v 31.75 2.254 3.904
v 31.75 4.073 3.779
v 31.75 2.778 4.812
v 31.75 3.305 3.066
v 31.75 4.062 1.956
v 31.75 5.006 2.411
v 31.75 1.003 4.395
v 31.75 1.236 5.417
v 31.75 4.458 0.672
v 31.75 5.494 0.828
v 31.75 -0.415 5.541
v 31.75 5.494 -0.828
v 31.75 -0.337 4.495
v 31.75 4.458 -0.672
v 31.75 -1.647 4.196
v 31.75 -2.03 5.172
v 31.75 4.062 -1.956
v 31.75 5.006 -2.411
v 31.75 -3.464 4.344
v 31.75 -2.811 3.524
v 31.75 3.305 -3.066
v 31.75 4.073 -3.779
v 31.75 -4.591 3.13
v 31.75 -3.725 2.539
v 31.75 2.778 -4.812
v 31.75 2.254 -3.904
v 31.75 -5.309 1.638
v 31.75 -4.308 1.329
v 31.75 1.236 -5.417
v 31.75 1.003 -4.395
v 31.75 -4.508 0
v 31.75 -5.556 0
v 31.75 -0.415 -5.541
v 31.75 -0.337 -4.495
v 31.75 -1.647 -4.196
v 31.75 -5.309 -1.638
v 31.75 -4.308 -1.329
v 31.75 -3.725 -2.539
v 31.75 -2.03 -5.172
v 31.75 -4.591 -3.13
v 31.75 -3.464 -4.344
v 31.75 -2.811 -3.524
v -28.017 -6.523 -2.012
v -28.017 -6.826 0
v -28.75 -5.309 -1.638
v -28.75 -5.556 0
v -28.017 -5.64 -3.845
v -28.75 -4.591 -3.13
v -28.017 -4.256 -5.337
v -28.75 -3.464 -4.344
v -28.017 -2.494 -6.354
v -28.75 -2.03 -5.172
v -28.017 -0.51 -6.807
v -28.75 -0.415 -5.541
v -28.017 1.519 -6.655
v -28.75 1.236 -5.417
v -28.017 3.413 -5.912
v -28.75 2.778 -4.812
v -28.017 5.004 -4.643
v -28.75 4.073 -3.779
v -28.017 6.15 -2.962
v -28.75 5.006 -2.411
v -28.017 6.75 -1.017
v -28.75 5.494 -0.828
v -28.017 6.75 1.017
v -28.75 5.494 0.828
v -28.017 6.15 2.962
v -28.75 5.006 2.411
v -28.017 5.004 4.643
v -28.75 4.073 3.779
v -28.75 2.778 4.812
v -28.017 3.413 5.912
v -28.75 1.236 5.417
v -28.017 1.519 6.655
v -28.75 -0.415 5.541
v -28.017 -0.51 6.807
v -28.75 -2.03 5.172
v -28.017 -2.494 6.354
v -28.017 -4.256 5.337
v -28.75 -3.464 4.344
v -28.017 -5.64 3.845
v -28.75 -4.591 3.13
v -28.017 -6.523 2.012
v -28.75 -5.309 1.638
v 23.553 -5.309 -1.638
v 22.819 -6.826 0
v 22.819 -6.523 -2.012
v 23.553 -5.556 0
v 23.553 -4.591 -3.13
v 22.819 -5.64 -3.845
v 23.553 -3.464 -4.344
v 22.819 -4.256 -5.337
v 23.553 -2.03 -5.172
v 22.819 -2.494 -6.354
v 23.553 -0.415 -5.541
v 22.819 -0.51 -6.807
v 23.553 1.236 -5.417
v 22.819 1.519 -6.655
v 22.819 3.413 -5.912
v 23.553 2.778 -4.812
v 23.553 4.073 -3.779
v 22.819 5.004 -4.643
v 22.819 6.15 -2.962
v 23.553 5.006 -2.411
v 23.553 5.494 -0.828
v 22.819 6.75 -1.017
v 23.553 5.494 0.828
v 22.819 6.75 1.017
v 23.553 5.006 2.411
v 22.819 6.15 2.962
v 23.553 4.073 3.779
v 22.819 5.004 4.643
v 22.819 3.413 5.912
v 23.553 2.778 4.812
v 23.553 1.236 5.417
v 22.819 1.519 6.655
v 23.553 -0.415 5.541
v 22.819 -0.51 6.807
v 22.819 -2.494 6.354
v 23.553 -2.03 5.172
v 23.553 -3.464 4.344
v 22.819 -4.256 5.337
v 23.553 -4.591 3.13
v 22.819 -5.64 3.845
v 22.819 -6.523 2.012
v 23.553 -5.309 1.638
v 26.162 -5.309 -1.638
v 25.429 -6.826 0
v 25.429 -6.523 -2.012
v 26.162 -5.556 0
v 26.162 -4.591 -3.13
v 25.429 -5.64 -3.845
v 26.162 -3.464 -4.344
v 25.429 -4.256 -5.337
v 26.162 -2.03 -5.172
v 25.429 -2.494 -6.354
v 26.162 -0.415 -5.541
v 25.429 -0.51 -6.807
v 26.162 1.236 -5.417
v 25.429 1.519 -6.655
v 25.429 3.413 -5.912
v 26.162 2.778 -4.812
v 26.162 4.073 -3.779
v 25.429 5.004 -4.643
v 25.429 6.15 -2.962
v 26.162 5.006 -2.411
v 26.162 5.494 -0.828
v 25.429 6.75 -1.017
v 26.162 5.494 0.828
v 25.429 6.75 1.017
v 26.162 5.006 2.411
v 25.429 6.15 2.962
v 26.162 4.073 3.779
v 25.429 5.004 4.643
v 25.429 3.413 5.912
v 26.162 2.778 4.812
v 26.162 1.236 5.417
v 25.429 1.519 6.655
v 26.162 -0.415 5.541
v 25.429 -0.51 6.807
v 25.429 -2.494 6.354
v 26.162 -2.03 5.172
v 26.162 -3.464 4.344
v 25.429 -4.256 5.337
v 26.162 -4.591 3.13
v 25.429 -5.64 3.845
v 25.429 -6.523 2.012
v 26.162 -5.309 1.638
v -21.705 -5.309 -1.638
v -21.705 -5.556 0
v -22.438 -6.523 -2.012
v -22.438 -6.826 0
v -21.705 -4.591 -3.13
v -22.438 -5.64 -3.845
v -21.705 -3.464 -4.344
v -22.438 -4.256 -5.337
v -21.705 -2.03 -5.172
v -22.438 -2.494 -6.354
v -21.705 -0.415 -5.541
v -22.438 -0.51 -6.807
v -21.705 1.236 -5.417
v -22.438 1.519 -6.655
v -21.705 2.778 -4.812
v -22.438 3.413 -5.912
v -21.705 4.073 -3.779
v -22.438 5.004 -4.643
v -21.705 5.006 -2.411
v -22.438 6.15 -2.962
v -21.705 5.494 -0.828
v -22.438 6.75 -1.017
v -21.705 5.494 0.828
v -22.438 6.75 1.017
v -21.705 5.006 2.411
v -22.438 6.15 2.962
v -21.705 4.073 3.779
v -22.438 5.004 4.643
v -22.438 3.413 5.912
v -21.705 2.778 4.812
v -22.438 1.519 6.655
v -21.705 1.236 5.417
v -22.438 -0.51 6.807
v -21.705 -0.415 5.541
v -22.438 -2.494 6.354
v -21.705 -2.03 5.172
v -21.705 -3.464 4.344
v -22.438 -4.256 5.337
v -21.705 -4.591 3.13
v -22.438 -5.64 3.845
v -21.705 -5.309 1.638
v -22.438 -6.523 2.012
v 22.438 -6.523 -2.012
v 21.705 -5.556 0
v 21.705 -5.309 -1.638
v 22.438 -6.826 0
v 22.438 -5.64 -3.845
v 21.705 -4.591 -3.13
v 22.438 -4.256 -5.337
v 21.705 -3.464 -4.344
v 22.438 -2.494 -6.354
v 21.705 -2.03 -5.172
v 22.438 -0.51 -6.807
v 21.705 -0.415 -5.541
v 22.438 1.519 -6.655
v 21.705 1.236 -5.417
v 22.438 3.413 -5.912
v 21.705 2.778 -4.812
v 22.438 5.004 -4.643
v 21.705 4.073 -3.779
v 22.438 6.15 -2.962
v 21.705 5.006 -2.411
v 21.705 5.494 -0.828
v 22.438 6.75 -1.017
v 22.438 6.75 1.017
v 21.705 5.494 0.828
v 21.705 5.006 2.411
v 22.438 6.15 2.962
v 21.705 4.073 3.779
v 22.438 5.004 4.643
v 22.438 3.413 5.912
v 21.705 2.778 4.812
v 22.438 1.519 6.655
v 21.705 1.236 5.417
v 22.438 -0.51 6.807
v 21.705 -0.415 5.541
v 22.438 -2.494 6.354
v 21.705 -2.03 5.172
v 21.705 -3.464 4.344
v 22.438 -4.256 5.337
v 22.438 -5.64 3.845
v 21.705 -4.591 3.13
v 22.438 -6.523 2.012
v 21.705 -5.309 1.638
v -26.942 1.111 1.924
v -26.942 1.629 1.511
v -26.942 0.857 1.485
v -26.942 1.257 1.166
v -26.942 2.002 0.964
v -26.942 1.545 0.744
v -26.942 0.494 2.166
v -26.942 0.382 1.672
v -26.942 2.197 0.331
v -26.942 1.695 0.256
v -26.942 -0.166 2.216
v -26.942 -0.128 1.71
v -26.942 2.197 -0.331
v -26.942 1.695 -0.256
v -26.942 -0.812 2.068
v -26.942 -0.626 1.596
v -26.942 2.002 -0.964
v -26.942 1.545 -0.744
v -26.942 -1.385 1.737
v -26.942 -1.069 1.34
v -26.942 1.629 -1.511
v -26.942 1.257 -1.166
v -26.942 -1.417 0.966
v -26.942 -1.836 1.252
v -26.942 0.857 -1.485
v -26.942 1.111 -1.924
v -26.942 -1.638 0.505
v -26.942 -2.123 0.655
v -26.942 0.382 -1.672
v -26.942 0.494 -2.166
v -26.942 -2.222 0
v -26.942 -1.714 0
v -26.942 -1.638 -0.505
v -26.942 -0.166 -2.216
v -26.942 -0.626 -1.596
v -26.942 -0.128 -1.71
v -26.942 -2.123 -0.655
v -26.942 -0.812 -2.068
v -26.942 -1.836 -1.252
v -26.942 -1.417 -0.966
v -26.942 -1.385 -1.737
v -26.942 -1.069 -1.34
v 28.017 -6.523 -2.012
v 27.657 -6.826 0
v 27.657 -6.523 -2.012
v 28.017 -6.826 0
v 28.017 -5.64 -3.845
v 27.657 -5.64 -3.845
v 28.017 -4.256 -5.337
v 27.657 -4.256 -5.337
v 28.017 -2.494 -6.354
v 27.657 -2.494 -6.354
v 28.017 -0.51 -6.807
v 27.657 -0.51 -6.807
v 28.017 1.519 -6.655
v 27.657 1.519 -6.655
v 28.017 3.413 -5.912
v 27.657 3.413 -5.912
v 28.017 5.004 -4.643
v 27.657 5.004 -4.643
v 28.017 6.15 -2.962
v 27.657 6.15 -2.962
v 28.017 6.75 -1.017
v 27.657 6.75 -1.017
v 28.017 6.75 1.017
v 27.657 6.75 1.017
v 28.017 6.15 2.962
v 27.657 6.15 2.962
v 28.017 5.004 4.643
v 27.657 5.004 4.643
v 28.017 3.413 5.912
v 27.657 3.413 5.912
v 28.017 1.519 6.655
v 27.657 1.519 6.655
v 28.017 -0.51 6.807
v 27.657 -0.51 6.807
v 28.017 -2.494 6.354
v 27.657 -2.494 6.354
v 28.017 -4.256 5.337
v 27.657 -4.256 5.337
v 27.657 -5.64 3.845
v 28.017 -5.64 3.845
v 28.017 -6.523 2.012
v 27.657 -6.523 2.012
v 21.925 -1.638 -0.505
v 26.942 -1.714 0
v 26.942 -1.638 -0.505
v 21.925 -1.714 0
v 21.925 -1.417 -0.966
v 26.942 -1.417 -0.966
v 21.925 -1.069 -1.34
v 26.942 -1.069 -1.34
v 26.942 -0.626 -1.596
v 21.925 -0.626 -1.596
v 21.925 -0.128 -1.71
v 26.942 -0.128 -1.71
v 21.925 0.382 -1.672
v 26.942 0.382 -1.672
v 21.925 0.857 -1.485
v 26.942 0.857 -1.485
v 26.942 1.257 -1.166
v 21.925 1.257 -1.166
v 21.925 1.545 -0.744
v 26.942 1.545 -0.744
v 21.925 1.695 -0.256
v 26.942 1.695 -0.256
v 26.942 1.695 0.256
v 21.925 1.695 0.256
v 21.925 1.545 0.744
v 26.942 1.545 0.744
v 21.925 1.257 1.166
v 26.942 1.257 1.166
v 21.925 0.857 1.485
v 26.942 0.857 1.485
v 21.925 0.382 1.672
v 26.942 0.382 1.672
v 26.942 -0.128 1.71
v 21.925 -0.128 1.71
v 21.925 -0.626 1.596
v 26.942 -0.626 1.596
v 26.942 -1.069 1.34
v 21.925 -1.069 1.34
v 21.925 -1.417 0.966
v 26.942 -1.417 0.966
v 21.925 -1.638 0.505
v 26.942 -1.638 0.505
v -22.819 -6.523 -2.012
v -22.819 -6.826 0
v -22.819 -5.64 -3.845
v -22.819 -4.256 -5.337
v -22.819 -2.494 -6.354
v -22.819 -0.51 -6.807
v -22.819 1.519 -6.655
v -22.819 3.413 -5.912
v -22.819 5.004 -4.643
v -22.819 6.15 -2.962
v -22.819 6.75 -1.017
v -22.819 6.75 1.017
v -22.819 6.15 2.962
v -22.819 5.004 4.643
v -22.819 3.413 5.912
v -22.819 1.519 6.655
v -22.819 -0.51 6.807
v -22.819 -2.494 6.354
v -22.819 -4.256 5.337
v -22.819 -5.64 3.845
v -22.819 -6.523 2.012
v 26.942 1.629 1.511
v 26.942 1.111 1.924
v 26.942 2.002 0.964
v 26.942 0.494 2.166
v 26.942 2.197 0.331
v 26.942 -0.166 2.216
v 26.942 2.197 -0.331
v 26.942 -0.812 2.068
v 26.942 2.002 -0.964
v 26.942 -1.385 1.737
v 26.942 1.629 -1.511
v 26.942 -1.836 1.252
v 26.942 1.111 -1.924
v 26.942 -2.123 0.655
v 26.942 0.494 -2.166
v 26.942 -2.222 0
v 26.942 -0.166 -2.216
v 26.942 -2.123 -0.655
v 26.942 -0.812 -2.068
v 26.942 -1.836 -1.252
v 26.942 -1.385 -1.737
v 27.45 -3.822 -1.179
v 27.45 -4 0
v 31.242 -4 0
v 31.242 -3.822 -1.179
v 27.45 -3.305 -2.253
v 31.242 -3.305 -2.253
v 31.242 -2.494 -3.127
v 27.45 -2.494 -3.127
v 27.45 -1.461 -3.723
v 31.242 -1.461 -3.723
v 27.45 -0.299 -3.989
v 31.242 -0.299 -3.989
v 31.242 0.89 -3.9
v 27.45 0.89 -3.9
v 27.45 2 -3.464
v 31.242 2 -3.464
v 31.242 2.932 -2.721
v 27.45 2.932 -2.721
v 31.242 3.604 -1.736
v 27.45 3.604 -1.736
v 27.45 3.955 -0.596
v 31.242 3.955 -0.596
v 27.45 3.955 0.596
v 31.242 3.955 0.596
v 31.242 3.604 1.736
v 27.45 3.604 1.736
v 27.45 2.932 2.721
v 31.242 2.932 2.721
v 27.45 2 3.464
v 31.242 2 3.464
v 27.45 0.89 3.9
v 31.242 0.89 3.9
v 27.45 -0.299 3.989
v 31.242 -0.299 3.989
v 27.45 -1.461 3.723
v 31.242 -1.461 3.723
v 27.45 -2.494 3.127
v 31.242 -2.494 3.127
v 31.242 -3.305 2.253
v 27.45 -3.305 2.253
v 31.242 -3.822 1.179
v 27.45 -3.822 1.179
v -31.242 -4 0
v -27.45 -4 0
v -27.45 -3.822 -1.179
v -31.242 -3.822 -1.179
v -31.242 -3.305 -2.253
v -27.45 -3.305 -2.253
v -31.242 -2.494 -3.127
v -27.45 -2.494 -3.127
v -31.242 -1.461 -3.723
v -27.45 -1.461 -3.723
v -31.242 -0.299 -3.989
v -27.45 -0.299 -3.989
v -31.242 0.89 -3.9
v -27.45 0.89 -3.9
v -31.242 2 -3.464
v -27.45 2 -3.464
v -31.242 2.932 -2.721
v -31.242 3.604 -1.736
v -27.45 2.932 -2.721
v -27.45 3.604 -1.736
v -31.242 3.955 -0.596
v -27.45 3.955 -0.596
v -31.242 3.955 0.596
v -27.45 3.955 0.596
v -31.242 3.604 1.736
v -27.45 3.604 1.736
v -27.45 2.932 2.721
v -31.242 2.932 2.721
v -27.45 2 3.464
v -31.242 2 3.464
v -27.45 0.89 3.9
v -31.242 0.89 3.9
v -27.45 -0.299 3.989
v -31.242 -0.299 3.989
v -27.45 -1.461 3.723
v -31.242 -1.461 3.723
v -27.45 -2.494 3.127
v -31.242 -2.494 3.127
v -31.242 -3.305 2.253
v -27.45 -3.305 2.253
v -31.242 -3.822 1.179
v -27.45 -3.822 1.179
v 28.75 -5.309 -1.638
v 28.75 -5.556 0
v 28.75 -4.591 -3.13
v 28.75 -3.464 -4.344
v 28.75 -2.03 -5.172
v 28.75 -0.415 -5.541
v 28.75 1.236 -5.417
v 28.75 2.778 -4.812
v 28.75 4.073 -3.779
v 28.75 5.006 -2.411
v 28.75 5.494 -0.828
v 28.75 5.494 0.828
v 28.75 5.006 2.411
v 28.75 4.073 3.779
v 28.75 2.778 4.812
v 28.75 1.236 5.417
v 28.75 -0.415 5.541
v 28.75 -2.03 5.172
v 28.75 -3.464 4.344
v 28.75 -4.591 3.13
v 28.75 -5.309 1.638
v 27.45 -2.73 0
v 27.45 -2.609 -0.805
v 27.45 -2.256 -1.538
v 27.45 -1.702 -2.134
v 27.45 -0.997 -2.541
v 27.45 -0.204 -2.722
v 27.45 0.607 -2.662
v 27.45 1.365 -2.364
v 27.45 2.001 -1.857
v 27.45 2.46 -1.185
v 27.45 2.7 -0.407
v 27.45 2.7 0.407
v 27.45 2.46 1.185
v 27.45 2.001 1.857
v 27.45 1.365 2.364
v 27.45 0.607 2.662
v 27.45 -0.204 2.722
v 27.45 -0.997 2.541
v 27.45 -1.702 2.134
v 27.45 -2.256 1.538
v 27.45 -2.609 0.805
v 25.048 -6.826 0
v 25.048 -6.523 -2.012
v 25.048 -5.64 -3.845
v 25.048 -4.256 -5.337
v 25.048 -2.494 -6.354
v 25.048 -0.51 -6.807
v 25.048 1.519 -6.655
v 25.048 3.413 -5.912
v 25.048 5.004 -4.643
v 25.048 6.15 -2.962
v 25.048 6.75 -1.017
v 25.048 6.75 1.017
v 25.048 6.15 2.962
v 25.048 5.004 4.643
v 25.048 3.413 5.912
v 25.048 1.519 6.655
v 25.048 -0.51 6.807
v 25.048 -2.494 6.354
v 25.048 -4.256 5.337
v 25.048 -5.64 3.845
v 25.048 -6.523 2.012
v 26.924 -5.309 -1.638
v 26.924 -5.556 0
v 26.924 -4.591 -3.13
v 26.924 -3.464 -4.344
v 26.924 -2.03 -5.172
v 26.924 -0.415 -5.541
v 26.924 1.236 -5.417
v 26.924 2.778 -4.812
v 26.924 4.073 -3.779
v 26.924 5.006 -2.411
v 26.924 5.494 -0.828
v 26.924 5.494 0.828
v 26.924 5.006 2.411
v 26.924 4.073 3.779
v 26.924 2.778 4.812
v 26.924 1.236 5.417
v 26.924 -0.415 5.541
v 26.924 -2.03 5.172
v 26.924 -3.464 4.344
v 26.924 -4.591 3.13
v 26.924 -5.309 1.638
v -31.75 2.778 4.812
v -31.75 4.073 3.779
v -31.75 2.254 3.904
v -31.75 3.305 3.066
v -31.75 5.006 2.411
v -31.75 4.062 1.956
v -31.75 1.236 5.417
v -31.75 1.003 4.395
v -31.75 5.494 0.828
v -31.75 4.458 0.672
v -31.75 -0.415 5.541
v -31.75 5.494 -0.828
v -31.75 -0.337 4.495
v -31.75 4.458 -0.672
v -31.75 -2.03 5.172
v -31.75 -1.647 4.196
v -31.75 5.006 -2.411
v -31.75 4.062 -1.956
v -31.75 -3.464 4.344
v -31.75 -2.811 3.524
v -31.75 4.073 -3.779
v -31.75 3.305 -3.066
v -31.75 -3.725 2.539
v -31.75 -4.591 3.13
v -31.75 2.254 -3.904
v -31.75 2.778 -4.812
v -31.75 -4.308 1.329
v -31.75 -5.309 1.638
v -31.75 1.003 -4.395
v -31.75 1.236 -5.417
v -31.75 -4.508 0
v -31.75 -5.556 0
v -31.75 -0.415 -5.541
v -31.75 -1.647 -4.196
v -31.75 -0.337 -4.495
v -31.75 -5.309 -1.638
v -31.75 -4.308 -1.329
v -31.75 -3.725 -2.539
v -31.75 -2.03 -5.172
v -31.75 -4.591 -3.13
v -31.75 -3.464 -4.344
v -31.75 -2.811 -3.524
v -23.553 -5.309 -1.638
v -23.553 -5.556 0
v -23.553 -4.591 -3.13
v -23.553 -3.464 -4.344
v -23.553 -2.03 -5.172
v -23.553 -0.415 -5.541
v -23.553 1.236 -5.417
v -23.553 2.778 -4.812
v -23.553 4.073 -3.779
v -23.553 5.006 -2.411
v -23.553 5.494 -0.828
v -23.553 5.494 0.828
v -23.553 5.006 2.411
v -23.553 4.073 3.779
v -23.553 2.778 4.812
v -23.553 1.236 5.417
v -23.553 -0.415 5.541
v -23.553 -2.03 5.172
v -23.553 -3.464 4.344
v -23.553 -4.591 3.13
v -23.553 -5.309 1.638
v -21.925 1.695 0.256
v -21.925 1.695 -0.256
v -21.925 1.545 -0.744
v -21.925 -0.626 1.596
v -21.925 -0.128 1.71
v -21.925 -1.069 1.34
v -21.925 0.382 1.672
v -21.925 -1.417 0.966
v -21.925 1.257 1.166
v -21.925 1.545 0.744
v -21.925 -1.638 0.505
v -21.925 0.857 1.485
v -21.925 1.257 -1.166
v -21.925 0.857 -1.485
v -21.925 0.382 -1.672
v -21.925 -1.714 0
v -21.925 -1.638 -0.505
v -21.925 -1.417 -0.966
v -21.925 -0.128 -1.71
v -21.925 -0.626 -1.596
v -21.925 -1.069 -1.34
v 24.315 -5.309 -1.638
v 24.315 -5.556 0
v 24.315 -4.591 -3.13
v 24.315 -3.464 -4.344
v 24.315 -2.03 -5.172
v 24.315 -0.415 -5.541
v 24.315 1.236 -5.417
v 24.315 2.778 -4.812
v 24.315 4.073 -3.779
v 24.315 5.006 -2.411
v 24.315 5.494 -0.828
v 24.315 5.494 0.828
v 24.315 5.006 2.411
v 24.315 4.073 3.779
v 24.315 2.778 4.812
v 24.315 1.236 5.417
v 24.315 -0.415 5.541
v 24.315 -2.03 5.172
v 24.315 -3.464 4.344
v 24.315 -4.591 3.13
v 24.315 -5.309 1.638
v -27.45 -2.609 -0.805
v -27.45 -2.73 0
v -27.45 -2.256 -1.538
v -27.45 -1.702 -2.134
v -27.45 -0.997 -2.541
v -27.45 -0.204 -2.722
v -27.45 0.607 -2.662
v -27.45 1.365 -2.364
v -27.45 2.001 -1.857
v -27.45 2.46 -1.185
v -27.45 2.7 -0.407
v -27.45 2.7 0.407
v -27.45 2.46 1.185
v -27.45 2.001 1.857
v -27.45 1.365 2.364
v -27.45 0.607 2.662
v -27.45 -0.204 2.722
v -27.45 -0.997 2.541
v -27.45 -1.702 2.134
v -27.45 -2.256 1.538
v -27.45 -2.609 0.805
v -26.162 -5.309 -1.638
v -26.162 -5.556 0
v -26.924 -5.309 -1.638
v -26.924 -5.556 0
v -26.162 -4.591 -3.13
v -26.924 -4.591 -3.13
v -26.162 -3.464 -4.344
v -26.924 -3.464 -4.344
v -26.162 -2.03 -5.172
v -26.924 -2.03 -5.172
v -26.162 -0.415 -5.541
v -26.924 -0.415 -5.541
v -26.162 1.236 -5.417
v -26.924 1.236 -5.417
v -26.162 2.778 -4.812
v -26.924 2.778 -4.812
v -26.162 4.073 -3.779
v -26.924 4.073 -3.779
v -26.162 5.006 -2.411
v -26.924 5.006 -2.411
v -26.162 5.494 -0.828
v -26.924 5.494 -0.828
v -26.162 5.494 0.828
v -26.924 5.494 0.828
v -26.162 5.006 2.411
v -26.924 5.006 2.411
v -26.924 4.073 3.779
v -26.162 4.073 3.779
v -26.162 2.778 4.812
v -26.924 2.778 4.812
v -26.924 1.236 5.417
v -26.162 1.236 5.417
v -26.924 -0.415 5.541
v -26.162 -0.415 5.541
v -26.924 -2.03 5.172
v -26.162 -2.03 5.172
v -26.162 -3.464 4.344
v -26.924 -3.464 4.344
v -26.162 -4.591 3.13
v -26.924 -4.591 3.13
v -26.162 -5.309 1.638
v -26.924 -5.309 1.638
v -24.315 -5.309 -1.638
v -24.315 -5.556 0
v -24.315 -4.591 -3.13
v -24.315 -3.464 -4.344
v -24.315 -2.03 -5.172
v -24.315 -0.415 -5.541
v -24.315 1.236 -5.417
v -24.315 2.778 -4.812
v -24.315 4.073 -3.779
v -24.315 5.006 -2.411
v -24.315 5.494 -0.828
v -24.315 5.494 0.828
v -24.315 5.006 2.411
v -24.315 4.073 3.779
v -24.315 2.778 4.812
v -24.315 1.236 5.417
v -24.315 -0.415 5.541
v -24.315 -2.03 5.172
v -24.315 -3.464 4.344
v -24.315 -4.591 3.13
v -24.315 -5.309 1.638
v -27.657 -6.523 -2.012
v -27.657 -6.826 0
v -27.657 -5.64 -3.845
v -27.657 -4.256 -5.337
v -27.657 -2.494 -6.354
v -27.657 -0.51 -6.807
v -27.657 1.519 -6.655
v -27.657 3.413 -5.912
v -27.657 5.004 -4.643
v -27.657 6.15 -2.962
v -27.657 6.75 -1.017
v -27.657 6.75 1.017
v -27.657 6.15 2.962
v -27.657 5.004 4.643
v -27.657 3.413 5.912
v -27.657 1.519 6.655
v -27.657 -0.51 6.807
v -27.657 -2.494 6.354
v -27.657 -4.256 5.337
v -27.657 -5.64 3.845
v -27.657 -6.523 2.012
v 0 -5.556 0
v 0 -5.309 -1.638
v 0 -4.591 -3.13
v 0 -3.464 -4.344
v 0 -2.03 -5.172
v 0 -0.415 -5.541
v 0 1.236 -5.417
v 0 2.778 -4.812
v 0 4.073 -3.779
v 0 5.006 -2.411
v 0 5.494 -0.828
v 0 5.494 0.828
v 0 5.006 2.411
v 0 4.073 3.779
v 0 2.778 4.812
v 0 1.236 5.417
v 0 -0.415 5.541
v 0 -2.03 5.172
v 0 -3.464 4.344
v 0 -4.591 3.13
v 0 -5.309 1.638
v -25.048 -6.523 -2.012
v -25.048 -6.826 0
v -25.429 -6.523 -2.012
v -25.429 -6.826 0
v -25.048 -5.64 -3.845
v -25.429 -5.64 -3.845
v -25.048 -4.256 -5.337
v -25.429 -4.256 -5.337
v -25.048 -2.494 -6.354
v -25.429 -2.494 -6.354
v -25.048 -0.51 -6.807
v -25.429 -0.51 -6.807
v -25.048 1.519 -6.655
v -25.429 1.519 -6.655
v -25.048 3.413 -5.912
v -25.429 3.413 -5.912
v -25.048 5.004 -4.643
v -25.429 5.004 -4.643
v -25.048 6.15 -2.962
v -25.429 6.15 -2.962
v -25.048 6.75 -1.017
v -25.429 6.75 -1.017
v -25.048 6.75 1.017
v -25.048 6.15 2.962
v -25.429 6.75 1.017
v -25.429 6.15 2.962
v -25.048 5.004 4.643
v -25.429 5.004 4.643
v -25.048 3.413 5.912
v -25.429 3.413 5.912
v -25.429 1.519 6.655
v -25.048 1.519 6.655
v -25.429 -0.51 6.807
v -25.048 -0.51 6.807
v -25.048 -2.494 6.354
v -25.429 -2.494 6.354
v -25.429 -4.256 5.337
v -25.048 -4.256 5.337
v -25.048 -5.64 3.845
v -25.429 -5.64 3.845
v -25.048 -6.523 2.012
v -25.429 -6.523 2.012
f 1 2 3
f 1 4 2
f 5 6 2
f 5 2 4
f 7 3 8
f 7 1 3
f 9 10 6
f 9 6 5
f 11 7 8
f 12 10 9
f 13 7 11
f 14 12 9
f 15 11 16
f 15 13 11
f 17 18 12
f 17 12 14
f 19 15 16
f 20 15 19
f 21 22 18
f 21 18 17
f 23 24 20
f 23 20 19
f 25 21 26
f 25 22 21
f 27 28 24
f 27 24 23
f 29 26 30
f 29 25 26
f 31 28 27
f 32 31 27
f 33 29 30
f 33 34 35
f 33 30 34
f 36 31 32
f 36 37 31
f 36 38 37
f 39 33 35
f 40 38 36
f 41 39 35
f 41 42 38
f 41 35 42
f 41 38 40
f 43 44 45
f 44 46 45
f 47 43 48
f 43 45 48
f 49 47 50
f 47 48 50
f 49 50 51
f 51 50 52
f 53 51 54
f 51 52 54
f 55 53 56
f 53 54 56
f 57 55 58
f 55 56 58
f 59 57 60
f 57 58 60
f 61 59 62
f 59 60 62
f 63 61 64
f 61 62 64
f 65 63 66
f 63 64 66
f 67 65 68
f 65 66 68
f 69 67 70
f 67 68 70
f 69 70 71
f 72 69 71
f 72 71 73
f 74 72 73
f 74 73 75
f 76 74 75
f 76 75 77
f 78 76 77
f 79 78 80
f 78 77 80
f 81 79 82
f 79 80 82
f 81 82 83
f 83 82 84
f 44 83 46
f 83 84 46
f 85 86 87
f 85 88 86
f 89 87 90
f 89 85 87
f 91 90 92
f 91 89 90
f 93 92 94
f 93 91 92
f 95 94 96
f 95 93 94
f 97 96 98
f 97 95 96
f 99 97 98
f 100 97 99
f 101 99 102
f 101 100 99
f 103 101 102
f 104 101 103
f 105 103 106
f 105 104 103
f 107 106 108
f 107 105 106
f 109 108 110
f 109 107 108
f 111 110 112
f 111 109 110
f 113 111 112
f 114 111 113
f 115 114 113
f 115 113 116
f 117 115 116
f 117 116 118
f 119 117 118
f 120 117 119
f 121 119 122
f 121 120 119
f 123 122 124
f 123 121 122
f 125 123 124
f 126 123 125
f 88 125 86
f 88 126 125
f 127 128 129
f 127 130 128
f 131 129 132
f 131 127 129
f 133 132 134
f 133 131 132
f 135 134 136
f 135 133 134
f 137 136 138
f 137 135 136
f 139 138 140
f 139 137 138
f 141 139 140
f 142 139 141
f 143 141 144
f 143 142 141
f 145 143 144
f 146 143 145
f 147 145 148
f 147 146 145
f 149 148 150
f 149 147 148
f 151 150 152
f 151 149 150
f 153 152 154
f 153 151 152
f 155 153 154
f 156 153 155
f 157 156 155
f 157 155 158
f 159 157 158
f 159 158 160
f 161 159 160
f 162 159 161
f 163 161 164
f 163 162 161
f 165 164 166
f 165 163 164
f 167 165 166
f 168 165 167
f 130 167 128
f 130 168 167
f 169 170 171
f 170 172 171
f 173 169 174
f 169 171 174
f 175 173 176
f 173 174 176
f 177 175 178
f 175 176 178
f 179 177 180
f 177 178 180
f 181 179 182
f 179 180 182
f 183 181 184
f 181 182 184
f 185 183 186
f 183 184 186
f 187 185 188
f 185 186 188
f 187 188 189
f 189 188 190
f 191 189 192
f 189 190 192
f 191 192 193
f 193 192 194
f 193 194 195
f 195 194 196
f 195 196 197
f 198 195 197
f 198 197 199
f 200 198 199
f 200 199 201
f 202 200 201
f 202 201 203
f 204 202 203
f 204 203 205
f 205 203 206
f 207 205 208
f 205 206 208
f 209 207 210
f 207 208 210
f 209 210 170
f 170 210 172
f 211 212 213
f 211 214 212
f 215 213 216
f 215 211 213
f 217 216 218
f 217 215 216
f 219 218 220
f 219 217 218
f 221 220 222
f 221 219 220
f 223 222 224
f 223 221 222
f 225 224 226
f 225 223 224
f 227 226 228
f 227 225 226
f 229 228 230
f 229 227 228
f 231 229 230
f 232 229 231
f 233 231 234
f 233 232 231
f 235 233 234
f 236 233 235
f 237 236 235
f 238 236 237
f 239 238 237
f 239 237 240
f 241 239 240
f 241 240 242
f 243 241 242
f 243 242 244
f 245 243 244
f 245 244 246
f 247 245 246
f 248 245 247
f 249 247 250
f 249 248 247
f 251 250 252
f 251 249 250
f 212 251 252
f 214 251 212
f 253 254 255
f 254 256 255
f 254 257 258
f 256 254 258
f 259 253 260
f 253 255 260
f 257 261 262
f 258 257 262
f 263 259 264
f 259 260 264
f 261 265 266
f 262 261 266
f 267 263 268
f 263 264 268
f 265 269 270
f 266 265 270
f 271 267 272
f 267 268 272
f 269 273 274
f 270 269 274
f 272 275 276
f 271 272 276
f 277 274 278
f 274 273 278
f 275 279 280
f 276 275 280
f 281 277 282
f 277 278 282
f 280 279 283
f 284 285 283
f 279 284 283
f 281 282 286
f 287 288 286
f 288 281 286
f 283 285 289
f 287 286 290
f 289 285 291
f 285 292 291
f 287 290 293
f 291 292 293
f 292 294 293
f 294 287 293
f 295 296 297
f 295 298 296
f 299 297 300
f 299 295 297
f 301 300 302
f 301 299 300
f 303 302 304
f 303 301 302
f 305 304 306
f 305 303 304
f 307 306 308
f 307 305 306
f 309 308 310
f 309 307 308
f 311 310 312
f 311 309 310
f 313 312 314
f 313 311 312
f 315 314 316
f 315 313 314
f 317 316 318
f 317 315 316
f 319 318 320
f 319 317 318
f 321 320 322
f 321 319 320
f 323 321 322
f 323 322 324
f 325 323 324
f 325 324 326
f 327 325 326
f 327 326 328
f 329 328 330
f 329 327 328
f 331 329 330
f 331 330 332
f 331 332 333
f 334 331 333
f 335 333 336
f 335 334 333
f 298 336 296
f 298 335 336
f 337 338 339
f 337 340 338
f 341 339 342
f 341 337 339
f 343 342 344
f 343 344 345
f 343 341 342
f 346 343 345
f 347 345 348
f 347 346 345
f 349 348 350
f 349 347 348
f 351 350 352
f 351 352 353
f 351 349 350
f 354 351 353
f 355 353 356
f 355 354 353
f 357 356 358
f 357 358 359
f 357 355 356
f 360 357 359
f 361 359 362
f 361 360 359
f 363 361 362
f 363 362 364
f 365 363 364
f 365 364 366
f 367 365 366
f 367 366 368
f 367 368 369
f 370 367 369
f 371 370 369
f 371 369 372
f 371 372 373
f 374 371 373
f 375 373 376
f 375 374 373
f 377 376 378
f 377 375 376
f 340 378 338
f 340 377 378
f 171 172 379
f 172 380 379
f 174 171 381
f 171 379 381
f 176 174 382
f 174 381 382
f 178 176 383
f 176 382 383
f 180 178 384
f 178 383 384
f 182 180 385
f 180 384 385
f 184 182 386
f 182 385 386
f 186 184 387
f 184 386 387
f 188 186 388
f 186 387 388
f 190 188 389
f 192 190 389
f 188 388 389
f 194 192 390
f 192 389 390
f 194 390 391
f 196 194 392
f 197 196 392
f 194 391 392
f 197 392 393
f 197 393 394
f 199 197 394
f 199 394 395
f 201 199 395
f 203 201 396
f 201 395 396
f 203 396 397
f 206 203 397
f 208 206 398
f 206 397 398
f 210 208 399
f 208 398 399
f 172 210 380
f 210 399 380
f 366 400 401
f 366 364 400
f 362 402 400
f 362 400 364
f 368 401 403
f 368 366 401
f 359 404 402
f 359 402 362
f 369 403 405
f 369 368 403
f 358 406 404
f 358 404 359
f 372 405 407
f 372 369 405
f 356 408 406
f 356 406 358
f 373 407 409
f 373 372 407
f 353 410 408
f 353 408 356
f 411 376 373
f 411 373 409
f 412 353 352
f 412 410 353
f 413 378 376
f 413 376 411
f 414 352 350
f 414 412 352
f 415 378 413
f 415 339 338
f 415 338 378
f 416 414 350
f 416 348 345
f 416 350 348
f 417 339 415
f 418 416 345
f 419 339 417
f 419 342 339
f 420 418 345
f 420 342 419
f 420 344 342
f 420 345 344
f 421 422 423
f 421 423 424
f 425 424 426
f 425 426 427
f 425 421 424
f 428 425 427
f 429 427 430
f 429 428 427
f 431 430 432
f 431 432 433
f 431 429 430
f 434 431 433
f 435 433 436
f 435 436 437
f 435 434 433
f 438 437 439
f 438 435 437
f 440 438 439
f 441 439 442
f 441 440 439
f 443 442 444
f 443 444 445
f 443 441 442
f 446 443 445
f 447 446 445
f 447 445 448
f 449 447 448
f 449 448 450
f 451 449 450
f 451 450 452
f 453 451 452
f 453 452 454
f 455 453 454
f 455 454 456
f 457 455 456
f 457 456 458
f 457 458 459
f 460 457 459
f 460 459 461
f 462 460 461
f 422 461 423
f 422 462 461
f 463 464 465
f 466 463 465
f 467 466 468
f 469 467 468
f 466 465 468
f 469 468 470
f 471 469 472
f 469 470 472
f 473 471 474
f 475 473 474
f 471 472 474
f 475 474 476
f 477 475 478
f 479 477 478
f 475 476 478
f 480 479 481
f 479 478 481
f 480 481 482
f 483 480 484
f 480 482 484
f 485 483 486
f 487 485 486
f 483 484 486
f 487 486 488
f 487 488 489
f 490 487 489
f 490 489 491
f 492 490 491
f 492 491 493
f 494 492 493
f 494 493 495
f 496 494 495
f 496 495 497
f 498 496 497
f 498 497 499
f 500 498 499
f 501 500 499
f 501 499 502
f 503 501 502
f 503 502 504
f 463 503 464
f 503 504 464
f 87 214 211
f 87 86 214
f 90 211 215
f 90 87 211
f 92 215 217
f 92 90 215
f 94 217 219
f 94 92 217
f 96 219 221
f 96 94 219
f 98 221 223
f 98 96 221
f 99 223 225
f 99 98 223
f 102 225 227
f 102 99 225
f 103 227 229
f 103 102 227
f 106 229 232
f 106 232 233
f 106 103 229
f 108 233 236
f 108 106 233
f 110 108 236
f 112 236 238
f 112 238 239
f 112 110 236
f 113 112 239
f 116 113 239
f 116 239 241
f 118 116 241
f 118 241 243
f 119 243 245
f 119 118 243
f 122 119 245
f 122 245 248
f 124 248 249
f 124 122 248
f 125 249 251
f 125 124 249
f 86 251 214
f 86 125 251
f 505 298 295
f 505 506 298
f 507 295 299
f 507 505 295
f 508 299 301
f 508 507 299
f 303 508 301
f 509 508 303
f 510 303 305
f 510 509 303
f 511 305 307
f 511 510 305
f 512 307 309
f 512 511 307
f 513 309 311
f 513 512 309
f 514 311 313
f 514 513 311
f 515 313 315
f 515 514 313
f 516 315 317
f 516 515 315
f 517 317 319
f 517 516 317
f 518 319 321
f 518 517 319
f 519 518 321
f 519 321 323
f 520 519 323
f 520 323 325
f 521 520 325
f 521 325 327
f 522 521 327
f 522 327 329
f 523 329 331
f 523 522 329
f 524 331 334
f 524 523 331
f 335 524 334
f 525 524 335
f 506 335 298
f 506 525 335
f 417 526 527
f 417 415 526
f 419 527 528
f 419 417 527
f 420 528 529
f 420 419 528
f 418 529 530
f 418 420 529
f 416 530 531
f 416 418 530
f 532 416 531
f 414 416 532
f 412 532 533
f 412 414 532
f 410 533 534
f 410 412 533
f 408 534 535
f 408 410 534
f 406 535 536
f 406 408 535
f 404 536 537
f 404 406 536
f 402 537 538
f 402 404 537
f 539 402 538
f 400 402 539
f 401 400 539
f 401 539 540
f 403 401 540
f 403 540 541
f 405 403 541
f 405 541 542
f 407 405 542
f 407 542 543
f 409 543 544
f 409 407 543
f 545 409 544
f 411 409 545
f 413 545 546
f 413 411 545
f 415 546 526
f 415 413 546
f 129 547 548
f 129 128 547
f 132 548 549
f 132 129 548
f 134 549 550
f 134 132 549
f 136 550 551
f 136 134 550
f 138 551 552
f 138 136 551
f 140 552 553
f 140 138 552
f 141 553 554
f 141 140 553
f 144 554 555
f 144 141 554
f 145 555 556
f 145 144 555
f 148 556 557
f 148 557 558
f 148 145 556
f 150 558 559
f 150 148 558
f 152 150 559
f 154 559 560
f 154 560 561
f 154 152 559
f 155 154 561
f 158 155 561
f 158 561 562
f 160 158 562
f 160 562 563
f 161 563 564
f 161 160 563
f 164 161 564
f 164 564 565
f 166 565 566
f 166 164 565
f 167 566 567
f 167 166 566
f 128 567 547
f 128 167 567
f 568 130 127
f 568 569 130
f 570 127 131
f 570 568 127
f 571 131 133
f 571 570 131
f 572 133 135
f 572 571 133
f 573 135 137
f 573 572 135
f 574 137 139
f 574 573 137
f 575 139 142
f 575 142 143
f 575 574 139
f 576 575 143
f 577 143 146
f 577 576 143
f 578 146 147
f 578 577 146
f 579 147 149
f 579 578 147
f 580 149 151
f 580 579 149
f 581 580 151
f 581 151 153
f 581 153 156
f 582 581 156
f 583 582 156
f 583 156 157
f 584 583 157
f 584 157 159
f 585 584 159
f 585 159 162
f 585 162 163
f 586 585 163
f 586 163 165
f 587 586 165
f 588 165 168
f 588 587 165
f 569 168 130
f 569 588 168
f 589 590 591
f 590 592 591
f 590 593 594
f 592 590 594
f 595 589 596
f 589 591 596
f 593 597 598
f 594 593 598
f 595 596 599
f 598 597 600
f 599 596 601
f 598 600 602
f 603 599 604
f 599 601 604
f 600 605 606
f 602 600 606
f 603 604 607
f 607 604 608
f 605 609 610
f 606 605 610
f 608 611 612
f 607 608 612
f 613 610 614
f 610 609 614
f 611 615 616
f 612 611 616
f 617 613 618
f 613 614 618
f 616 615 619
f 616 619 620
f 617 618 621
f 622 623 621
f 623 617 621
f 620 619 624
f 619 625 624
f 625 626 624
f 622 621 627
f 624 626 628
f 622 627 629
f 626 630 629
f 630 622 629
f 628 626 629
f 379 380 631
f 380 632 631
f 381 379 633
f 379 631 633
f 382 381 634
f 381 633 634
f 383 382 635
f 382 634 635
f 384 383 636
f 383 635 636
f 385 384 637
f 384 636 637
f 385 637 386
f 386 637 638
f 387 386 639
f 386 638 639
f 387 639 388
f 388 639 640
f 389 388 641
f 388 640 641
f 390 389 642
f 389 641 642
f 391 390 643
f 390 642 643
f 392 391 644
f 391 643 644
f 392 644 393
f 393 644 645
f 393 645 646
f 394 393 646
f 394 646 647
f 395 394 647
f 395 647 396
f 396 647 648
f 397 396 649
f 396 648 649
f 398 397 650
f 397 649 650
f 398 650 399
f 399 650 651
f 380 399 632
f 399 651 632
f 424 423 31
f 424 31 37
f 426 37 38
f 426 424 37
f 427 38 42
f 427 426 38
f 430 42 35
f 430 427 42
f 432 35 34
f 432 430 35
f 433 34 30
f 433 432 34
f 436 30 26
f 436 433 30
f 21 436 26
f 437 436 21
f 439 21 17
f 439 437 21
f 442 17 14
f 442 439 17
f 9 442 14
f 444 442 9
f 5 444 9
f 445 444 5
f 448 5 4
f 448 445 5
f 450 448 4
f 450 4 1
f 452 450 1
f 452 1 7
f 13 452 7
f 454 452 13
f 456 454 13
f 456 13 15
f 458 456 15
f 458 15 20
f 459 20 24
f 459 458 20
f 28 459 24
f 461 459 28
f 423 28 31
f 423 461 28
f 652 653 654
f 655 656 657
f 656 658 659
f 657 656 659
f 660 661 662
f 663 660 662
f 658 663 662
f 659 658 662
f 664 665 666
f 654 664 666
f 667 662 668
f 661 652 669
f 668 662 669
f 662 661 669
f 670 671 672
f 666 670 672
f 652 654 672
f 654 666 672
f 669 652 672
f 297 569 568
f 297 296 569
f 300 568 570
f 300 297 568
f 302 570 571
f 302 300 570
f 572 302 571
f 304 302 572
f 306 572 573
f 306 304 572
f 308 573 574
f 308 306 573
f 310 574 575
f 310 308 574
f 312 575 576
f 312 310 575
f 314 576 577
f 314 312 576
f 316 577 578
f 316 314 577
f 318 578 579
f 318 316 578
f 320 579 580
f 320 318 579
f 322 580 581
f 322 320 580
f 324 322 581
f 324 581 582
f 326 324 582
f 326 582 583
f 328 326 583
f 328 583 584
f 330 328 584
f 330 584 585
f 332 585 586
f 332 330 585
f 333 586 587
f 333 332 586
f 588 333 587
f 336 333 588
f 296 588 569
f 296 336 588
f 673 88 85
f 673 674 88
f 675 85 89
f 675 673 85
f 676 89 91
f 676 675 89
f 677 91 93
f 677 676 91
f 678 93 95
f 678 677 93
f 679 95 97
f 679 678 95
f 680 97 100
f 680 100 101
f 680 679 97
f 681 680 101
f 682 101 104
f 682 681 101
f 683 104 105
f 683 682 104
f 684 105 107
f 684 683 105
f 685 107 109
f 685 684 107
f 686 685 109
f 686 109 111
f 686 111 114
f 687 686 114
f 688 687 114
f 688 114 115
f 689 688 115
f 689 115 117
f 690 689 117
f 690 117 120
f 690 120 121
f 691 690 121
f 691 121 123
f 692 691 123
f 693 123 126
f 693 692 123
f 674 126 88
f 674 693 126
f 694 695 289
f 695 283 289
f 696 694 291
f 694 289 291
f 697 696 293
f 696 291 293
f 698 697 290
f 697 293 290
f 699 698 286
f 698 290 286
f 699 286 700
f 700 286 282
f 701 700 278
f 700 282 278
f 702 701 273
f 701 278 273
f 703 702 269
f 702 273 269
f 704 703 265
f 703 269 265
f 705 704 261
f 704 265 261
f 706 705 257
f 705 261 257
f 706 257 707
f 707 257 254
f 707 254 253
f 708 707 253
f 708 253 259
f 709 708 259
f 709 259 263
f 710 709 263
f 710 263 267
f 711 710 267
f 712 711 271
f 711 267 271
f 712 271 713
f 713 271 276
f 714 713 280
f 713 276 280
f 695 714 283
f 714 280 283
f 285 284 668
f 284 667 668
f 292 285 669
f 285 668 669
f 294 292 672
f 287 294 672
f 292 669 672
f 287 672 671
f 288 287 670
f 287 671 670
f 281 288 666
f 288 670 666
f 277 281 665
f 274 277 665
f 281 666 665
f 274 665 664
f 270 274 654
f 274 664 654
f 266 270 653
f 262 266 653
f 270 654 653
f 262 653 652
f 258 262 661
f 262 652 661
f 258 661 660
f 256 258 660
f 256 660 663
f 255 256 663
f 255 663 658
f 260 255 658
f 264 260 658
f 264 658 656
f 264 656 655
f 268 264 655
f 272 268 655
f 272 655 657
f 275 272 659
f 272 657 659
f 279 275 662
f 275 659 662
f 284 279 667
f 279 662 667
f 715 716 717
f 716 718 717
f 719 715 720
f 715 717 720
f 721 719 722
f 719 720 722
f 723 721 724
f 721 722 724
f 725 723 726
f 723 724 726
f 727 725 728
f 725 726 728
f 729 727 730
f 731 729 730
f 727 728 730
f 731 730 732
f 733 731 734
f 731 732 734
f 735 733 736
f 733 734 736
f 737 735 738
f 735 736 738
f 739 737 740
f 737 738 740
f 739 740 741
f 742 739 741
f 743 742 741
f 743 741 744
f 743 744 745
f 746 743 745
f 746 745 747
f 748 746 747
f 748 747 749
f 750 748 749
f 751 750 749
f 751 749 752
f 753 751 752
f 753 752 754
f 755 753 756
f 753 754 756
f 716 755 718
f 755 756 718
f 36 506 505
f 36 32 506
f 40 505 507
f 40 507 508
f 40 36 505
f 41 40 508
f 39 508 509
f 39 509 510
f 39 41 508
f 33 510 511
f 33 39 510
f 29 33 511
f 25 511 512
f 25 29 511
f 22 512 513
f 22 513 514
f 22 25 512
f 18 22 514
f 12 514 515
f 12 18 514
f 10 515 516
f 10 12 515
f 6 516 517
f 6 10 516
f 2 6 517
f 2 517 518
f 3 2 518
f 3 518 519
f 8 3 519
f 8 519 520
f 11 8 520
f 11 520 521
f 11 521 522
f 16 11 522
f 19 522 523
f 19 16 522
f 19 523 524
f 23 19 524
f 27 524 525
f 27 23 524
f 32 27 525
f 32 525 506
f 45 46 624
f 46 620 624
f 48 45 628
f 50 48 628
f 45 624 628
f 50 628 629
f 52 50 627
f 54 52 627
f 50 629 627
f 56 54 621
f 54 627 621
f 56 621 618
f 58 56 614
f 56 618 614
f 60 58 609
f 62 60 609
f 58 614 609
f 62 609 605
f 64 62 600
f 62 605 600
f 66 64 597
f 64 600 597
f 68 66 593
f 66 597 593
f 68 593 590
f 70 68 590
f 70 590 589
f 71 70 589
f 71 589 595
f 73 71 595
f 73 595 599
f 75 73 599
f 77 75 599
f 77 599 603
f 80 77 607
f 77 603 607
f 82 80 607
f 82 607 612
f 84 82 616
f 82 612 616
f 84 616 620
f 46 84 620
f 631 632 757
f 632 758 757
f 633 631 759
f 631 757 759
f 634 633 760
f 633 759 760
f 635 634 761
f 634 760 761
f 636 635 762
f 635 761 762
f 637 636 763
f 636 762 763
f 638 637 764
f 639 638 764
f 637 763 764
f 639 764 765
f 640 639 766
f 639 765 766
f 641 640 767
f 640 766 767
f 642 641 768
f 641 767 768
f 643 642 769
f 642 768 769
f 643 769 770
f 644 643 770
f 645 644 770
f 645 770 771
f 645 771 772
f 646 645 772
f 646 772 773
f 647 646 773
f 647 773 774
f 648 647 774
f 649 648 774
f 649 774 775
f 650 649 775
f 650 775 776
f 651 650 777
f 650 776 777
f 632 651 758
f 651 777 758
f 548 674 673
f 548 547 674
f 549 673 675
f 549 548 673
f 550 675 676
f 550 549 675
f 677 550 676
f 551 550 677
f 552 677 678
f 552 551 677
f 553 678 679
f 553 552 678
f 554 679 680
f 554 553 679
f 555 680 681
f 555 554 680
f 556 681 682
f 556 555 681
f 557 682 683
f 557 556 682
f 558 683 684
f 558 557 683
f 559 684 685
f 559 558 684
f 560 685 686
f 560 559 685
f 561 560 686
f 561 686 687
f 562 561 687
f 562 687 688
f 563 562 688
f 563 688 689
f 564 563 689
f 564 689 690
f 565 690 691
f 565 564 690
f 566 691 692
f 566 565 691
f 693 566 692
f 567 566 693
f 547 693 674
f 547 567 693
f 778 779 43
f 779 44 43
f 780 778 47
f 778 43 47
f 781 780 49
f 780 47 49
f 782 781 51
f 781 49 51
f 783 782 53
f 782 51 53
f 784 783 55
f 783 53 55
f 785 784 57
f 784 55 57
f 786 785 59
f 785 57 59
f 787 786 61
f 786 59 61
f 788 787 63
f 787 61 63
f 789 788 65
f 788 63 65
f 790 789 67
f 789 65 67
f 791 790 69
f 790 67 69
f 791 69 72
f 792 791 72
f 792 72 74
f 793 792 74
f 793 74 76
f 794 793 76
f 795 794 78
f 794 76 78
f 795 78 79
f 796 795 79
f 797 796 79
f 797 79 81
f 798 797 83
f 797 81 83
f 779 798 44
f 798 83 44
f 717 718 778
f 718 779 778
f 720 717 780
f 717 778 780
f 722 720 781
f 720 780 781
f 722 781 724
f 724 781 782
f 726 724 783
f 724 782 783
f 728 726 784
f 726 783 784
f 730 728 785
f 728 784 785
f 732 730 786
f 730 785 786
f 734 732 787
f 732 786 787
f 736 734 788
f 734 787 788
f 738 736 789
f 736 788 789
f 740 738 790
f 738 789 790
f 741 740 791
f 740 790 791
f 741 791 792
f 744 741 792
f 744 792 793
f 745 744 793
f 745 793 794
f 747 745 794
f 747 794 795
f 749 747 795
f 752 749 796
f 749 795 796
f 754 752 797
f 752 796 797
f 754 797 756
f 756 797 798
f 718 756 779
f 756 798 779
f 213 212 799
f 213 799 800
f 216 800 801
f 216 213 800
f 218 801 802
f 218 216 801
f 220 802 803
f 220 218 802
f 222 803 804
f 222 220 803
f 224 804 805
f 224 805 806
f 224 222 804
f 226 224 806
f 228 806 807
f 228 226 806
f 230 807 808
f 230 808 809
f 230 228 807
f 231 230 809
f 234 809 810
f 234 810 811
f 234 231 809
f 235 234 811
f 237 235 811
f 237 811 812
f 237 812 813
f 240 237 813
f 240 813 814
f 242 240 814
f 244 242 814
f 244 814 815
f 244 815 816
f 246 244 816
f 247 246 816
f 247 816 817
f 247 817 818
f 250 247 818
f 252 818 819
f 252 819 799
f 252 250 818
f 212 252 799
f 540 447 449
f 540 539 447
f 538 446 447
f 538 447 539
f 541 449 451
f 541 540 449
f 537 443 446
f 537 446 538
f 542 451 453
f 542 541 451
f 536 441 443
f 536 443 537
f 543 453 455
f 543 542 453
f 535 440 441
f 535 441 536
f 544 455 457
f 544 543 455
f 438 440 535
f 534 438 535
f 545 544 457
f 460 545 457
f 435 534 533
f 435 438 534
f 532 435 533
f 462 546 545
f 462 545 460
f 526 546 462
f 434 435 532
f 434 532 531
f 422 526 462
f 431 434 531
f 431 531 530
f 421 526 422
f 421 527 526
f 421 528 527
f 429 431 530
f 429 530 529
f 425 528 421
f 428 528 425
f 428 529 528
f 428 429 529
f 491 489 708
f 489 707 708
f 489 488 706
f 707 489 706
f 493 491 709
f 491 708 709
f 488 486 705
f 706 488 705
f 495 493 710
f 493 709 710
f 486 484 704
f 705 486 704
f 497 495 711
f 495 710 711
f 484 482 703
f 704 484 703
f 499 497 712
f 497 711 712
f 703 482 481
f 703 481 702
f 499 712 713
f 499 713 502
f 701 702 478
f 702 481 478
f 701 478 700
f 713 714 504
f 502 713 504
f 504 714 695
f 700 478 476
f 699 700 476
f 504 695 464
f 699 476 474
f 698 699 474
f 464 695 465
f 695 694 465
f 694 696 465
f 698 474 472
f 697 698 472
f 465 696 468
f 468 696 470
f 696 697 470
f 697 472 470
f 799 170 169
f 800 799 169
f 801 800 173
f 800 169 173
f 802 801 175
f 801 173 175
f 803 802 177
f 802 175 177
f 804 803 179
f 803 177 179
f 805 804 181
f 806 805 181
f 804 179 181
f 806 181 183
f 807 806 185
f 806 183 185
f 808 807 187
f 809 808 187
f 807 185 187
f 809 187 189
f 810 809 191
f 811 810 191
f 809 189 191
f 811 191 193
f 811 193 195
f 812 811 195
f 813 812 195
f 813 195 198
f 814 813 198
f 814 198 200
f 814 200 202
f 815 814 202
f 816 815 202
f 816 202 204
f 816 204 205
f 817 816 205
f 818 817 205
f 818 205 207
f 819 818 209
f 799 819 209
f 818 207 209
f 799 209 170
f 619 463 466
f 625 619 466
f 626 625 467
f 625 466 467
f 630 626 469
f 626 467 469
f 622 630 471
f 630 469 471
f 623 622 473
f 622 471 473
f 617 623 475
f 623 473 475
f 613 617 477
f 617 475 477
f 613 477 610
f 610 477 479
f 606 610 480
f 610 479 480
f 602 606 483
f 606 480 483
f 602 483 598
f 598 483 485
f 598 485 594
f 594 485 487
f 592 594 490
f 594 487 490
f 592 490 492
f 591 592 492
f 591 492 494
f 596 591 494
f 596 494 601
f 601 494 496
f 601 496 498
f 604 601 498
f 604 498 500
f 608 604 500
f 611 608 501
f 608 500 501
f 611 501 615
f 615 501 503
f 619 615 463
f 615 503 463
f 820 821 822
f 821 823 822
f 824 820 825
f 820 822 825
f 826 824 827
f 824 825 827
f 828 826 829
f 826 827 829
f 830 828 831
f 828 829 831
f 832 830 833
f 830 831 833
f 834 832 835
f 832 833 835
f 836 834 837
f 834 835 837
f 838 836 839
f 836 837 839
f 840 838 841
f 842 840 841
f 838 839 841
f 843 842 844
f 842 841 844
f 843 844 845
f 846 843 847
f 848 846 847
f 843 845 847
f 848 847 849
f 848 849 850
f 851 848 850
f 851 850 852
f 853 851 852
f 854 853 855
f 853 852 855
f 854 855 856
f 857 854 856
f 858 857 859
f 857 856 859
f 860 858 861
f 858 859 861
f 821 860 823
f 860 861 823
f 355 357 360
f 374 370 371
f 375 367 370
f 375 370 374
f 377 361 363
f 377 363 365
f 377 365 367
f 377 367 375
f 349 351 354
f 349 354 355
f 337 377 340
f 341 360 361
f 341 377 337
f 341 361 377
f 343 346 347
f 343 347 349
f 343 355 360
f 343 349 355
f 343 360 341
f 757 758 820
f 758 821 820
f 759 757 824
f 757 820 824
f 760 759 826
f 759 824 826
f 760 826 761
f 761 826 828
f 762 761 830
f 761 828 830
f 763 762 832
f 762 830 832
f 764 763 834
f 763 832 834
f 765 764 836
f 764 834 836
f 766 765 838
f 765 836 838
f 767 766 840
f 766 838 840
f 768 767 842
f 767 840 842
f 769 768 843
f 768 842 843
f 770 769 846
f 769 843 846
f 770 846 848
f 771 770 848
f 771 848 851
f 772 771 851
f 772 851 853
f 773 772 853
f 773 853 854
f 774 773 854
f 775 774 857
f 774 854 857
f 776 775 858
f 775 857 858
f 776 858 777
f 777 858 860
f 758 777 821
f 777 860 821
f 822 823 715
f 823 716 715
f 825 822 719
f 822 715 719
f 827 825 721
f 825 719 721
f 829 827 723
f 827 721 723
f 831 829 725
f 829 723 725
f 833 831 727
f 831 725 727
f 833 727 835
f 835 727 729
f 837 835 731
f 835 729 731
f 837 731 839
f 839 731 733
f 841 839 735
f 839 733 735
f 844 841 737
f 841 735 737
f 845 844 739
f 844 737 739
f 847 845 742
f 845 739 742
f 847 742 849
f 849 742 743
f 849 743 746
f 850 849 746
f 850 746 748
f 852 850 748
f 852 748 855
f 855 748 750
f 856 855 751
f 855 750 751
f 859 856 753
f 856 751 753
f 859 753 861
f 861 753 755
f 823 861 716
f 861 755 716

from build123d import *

# Parameters (mm, degrees)
CHAMFER1_SIZE = 0.508


with BuildPart() as part:
    # Sketch2 → Revolve1 (revolve)
    with BuildSketch(Plane.XY, mode=Mode.PRIVATE) as revolve1_sk:
        Polygon((-28.75, 5.55625), (-31.75, 5.55625), (-31.75, 4), (-27.45, 4), (-27.45, 2.73), (-26.942, 2.222), (-26.942, 1.7145), (-21.925, 1.7145), (-21.925, 0), (0, 0), (0, 3.175), (0, 5.55625), (-21.705060633, 5.55625), (-22.438295474, 6.82625), (-22.819295474, 6.82625), (-23.552530316, 5.55625), (-24.314530316, 5.55625), (-25.047765158, 6.82625), (-25.428765158, 6.82625), (-26.162, 5.55625), (-26.924, 5.55625), (-27.657234842, 6.82625), (-28.016765158, 6.82625), align=None)
    revolve(revolve1_sk.sketch.rotate(Axis((-31.75, 0, 0), (1, 0, 0)), 180), axis=Axis((-31.75, 0, 0), (1, 0, 0)))

    # Chamfer1
    chamfer1_edges = [part.edges().sort_by_distance(p)[0] for p in [
        (-31.75, 4, 0),
    ]]
    chamfer(chamfer1_edges, length=CHAMFER1_SIZE)

    # Mirror1: part across plane


with BuildPart() as part_1:
    add(part.part)
    add(part.part.mirror(Plane(origin=(0, 0, 0), x_dir=(0, 0, 1), z_dir=(1, 0, 0))))


solid = part_1.part
